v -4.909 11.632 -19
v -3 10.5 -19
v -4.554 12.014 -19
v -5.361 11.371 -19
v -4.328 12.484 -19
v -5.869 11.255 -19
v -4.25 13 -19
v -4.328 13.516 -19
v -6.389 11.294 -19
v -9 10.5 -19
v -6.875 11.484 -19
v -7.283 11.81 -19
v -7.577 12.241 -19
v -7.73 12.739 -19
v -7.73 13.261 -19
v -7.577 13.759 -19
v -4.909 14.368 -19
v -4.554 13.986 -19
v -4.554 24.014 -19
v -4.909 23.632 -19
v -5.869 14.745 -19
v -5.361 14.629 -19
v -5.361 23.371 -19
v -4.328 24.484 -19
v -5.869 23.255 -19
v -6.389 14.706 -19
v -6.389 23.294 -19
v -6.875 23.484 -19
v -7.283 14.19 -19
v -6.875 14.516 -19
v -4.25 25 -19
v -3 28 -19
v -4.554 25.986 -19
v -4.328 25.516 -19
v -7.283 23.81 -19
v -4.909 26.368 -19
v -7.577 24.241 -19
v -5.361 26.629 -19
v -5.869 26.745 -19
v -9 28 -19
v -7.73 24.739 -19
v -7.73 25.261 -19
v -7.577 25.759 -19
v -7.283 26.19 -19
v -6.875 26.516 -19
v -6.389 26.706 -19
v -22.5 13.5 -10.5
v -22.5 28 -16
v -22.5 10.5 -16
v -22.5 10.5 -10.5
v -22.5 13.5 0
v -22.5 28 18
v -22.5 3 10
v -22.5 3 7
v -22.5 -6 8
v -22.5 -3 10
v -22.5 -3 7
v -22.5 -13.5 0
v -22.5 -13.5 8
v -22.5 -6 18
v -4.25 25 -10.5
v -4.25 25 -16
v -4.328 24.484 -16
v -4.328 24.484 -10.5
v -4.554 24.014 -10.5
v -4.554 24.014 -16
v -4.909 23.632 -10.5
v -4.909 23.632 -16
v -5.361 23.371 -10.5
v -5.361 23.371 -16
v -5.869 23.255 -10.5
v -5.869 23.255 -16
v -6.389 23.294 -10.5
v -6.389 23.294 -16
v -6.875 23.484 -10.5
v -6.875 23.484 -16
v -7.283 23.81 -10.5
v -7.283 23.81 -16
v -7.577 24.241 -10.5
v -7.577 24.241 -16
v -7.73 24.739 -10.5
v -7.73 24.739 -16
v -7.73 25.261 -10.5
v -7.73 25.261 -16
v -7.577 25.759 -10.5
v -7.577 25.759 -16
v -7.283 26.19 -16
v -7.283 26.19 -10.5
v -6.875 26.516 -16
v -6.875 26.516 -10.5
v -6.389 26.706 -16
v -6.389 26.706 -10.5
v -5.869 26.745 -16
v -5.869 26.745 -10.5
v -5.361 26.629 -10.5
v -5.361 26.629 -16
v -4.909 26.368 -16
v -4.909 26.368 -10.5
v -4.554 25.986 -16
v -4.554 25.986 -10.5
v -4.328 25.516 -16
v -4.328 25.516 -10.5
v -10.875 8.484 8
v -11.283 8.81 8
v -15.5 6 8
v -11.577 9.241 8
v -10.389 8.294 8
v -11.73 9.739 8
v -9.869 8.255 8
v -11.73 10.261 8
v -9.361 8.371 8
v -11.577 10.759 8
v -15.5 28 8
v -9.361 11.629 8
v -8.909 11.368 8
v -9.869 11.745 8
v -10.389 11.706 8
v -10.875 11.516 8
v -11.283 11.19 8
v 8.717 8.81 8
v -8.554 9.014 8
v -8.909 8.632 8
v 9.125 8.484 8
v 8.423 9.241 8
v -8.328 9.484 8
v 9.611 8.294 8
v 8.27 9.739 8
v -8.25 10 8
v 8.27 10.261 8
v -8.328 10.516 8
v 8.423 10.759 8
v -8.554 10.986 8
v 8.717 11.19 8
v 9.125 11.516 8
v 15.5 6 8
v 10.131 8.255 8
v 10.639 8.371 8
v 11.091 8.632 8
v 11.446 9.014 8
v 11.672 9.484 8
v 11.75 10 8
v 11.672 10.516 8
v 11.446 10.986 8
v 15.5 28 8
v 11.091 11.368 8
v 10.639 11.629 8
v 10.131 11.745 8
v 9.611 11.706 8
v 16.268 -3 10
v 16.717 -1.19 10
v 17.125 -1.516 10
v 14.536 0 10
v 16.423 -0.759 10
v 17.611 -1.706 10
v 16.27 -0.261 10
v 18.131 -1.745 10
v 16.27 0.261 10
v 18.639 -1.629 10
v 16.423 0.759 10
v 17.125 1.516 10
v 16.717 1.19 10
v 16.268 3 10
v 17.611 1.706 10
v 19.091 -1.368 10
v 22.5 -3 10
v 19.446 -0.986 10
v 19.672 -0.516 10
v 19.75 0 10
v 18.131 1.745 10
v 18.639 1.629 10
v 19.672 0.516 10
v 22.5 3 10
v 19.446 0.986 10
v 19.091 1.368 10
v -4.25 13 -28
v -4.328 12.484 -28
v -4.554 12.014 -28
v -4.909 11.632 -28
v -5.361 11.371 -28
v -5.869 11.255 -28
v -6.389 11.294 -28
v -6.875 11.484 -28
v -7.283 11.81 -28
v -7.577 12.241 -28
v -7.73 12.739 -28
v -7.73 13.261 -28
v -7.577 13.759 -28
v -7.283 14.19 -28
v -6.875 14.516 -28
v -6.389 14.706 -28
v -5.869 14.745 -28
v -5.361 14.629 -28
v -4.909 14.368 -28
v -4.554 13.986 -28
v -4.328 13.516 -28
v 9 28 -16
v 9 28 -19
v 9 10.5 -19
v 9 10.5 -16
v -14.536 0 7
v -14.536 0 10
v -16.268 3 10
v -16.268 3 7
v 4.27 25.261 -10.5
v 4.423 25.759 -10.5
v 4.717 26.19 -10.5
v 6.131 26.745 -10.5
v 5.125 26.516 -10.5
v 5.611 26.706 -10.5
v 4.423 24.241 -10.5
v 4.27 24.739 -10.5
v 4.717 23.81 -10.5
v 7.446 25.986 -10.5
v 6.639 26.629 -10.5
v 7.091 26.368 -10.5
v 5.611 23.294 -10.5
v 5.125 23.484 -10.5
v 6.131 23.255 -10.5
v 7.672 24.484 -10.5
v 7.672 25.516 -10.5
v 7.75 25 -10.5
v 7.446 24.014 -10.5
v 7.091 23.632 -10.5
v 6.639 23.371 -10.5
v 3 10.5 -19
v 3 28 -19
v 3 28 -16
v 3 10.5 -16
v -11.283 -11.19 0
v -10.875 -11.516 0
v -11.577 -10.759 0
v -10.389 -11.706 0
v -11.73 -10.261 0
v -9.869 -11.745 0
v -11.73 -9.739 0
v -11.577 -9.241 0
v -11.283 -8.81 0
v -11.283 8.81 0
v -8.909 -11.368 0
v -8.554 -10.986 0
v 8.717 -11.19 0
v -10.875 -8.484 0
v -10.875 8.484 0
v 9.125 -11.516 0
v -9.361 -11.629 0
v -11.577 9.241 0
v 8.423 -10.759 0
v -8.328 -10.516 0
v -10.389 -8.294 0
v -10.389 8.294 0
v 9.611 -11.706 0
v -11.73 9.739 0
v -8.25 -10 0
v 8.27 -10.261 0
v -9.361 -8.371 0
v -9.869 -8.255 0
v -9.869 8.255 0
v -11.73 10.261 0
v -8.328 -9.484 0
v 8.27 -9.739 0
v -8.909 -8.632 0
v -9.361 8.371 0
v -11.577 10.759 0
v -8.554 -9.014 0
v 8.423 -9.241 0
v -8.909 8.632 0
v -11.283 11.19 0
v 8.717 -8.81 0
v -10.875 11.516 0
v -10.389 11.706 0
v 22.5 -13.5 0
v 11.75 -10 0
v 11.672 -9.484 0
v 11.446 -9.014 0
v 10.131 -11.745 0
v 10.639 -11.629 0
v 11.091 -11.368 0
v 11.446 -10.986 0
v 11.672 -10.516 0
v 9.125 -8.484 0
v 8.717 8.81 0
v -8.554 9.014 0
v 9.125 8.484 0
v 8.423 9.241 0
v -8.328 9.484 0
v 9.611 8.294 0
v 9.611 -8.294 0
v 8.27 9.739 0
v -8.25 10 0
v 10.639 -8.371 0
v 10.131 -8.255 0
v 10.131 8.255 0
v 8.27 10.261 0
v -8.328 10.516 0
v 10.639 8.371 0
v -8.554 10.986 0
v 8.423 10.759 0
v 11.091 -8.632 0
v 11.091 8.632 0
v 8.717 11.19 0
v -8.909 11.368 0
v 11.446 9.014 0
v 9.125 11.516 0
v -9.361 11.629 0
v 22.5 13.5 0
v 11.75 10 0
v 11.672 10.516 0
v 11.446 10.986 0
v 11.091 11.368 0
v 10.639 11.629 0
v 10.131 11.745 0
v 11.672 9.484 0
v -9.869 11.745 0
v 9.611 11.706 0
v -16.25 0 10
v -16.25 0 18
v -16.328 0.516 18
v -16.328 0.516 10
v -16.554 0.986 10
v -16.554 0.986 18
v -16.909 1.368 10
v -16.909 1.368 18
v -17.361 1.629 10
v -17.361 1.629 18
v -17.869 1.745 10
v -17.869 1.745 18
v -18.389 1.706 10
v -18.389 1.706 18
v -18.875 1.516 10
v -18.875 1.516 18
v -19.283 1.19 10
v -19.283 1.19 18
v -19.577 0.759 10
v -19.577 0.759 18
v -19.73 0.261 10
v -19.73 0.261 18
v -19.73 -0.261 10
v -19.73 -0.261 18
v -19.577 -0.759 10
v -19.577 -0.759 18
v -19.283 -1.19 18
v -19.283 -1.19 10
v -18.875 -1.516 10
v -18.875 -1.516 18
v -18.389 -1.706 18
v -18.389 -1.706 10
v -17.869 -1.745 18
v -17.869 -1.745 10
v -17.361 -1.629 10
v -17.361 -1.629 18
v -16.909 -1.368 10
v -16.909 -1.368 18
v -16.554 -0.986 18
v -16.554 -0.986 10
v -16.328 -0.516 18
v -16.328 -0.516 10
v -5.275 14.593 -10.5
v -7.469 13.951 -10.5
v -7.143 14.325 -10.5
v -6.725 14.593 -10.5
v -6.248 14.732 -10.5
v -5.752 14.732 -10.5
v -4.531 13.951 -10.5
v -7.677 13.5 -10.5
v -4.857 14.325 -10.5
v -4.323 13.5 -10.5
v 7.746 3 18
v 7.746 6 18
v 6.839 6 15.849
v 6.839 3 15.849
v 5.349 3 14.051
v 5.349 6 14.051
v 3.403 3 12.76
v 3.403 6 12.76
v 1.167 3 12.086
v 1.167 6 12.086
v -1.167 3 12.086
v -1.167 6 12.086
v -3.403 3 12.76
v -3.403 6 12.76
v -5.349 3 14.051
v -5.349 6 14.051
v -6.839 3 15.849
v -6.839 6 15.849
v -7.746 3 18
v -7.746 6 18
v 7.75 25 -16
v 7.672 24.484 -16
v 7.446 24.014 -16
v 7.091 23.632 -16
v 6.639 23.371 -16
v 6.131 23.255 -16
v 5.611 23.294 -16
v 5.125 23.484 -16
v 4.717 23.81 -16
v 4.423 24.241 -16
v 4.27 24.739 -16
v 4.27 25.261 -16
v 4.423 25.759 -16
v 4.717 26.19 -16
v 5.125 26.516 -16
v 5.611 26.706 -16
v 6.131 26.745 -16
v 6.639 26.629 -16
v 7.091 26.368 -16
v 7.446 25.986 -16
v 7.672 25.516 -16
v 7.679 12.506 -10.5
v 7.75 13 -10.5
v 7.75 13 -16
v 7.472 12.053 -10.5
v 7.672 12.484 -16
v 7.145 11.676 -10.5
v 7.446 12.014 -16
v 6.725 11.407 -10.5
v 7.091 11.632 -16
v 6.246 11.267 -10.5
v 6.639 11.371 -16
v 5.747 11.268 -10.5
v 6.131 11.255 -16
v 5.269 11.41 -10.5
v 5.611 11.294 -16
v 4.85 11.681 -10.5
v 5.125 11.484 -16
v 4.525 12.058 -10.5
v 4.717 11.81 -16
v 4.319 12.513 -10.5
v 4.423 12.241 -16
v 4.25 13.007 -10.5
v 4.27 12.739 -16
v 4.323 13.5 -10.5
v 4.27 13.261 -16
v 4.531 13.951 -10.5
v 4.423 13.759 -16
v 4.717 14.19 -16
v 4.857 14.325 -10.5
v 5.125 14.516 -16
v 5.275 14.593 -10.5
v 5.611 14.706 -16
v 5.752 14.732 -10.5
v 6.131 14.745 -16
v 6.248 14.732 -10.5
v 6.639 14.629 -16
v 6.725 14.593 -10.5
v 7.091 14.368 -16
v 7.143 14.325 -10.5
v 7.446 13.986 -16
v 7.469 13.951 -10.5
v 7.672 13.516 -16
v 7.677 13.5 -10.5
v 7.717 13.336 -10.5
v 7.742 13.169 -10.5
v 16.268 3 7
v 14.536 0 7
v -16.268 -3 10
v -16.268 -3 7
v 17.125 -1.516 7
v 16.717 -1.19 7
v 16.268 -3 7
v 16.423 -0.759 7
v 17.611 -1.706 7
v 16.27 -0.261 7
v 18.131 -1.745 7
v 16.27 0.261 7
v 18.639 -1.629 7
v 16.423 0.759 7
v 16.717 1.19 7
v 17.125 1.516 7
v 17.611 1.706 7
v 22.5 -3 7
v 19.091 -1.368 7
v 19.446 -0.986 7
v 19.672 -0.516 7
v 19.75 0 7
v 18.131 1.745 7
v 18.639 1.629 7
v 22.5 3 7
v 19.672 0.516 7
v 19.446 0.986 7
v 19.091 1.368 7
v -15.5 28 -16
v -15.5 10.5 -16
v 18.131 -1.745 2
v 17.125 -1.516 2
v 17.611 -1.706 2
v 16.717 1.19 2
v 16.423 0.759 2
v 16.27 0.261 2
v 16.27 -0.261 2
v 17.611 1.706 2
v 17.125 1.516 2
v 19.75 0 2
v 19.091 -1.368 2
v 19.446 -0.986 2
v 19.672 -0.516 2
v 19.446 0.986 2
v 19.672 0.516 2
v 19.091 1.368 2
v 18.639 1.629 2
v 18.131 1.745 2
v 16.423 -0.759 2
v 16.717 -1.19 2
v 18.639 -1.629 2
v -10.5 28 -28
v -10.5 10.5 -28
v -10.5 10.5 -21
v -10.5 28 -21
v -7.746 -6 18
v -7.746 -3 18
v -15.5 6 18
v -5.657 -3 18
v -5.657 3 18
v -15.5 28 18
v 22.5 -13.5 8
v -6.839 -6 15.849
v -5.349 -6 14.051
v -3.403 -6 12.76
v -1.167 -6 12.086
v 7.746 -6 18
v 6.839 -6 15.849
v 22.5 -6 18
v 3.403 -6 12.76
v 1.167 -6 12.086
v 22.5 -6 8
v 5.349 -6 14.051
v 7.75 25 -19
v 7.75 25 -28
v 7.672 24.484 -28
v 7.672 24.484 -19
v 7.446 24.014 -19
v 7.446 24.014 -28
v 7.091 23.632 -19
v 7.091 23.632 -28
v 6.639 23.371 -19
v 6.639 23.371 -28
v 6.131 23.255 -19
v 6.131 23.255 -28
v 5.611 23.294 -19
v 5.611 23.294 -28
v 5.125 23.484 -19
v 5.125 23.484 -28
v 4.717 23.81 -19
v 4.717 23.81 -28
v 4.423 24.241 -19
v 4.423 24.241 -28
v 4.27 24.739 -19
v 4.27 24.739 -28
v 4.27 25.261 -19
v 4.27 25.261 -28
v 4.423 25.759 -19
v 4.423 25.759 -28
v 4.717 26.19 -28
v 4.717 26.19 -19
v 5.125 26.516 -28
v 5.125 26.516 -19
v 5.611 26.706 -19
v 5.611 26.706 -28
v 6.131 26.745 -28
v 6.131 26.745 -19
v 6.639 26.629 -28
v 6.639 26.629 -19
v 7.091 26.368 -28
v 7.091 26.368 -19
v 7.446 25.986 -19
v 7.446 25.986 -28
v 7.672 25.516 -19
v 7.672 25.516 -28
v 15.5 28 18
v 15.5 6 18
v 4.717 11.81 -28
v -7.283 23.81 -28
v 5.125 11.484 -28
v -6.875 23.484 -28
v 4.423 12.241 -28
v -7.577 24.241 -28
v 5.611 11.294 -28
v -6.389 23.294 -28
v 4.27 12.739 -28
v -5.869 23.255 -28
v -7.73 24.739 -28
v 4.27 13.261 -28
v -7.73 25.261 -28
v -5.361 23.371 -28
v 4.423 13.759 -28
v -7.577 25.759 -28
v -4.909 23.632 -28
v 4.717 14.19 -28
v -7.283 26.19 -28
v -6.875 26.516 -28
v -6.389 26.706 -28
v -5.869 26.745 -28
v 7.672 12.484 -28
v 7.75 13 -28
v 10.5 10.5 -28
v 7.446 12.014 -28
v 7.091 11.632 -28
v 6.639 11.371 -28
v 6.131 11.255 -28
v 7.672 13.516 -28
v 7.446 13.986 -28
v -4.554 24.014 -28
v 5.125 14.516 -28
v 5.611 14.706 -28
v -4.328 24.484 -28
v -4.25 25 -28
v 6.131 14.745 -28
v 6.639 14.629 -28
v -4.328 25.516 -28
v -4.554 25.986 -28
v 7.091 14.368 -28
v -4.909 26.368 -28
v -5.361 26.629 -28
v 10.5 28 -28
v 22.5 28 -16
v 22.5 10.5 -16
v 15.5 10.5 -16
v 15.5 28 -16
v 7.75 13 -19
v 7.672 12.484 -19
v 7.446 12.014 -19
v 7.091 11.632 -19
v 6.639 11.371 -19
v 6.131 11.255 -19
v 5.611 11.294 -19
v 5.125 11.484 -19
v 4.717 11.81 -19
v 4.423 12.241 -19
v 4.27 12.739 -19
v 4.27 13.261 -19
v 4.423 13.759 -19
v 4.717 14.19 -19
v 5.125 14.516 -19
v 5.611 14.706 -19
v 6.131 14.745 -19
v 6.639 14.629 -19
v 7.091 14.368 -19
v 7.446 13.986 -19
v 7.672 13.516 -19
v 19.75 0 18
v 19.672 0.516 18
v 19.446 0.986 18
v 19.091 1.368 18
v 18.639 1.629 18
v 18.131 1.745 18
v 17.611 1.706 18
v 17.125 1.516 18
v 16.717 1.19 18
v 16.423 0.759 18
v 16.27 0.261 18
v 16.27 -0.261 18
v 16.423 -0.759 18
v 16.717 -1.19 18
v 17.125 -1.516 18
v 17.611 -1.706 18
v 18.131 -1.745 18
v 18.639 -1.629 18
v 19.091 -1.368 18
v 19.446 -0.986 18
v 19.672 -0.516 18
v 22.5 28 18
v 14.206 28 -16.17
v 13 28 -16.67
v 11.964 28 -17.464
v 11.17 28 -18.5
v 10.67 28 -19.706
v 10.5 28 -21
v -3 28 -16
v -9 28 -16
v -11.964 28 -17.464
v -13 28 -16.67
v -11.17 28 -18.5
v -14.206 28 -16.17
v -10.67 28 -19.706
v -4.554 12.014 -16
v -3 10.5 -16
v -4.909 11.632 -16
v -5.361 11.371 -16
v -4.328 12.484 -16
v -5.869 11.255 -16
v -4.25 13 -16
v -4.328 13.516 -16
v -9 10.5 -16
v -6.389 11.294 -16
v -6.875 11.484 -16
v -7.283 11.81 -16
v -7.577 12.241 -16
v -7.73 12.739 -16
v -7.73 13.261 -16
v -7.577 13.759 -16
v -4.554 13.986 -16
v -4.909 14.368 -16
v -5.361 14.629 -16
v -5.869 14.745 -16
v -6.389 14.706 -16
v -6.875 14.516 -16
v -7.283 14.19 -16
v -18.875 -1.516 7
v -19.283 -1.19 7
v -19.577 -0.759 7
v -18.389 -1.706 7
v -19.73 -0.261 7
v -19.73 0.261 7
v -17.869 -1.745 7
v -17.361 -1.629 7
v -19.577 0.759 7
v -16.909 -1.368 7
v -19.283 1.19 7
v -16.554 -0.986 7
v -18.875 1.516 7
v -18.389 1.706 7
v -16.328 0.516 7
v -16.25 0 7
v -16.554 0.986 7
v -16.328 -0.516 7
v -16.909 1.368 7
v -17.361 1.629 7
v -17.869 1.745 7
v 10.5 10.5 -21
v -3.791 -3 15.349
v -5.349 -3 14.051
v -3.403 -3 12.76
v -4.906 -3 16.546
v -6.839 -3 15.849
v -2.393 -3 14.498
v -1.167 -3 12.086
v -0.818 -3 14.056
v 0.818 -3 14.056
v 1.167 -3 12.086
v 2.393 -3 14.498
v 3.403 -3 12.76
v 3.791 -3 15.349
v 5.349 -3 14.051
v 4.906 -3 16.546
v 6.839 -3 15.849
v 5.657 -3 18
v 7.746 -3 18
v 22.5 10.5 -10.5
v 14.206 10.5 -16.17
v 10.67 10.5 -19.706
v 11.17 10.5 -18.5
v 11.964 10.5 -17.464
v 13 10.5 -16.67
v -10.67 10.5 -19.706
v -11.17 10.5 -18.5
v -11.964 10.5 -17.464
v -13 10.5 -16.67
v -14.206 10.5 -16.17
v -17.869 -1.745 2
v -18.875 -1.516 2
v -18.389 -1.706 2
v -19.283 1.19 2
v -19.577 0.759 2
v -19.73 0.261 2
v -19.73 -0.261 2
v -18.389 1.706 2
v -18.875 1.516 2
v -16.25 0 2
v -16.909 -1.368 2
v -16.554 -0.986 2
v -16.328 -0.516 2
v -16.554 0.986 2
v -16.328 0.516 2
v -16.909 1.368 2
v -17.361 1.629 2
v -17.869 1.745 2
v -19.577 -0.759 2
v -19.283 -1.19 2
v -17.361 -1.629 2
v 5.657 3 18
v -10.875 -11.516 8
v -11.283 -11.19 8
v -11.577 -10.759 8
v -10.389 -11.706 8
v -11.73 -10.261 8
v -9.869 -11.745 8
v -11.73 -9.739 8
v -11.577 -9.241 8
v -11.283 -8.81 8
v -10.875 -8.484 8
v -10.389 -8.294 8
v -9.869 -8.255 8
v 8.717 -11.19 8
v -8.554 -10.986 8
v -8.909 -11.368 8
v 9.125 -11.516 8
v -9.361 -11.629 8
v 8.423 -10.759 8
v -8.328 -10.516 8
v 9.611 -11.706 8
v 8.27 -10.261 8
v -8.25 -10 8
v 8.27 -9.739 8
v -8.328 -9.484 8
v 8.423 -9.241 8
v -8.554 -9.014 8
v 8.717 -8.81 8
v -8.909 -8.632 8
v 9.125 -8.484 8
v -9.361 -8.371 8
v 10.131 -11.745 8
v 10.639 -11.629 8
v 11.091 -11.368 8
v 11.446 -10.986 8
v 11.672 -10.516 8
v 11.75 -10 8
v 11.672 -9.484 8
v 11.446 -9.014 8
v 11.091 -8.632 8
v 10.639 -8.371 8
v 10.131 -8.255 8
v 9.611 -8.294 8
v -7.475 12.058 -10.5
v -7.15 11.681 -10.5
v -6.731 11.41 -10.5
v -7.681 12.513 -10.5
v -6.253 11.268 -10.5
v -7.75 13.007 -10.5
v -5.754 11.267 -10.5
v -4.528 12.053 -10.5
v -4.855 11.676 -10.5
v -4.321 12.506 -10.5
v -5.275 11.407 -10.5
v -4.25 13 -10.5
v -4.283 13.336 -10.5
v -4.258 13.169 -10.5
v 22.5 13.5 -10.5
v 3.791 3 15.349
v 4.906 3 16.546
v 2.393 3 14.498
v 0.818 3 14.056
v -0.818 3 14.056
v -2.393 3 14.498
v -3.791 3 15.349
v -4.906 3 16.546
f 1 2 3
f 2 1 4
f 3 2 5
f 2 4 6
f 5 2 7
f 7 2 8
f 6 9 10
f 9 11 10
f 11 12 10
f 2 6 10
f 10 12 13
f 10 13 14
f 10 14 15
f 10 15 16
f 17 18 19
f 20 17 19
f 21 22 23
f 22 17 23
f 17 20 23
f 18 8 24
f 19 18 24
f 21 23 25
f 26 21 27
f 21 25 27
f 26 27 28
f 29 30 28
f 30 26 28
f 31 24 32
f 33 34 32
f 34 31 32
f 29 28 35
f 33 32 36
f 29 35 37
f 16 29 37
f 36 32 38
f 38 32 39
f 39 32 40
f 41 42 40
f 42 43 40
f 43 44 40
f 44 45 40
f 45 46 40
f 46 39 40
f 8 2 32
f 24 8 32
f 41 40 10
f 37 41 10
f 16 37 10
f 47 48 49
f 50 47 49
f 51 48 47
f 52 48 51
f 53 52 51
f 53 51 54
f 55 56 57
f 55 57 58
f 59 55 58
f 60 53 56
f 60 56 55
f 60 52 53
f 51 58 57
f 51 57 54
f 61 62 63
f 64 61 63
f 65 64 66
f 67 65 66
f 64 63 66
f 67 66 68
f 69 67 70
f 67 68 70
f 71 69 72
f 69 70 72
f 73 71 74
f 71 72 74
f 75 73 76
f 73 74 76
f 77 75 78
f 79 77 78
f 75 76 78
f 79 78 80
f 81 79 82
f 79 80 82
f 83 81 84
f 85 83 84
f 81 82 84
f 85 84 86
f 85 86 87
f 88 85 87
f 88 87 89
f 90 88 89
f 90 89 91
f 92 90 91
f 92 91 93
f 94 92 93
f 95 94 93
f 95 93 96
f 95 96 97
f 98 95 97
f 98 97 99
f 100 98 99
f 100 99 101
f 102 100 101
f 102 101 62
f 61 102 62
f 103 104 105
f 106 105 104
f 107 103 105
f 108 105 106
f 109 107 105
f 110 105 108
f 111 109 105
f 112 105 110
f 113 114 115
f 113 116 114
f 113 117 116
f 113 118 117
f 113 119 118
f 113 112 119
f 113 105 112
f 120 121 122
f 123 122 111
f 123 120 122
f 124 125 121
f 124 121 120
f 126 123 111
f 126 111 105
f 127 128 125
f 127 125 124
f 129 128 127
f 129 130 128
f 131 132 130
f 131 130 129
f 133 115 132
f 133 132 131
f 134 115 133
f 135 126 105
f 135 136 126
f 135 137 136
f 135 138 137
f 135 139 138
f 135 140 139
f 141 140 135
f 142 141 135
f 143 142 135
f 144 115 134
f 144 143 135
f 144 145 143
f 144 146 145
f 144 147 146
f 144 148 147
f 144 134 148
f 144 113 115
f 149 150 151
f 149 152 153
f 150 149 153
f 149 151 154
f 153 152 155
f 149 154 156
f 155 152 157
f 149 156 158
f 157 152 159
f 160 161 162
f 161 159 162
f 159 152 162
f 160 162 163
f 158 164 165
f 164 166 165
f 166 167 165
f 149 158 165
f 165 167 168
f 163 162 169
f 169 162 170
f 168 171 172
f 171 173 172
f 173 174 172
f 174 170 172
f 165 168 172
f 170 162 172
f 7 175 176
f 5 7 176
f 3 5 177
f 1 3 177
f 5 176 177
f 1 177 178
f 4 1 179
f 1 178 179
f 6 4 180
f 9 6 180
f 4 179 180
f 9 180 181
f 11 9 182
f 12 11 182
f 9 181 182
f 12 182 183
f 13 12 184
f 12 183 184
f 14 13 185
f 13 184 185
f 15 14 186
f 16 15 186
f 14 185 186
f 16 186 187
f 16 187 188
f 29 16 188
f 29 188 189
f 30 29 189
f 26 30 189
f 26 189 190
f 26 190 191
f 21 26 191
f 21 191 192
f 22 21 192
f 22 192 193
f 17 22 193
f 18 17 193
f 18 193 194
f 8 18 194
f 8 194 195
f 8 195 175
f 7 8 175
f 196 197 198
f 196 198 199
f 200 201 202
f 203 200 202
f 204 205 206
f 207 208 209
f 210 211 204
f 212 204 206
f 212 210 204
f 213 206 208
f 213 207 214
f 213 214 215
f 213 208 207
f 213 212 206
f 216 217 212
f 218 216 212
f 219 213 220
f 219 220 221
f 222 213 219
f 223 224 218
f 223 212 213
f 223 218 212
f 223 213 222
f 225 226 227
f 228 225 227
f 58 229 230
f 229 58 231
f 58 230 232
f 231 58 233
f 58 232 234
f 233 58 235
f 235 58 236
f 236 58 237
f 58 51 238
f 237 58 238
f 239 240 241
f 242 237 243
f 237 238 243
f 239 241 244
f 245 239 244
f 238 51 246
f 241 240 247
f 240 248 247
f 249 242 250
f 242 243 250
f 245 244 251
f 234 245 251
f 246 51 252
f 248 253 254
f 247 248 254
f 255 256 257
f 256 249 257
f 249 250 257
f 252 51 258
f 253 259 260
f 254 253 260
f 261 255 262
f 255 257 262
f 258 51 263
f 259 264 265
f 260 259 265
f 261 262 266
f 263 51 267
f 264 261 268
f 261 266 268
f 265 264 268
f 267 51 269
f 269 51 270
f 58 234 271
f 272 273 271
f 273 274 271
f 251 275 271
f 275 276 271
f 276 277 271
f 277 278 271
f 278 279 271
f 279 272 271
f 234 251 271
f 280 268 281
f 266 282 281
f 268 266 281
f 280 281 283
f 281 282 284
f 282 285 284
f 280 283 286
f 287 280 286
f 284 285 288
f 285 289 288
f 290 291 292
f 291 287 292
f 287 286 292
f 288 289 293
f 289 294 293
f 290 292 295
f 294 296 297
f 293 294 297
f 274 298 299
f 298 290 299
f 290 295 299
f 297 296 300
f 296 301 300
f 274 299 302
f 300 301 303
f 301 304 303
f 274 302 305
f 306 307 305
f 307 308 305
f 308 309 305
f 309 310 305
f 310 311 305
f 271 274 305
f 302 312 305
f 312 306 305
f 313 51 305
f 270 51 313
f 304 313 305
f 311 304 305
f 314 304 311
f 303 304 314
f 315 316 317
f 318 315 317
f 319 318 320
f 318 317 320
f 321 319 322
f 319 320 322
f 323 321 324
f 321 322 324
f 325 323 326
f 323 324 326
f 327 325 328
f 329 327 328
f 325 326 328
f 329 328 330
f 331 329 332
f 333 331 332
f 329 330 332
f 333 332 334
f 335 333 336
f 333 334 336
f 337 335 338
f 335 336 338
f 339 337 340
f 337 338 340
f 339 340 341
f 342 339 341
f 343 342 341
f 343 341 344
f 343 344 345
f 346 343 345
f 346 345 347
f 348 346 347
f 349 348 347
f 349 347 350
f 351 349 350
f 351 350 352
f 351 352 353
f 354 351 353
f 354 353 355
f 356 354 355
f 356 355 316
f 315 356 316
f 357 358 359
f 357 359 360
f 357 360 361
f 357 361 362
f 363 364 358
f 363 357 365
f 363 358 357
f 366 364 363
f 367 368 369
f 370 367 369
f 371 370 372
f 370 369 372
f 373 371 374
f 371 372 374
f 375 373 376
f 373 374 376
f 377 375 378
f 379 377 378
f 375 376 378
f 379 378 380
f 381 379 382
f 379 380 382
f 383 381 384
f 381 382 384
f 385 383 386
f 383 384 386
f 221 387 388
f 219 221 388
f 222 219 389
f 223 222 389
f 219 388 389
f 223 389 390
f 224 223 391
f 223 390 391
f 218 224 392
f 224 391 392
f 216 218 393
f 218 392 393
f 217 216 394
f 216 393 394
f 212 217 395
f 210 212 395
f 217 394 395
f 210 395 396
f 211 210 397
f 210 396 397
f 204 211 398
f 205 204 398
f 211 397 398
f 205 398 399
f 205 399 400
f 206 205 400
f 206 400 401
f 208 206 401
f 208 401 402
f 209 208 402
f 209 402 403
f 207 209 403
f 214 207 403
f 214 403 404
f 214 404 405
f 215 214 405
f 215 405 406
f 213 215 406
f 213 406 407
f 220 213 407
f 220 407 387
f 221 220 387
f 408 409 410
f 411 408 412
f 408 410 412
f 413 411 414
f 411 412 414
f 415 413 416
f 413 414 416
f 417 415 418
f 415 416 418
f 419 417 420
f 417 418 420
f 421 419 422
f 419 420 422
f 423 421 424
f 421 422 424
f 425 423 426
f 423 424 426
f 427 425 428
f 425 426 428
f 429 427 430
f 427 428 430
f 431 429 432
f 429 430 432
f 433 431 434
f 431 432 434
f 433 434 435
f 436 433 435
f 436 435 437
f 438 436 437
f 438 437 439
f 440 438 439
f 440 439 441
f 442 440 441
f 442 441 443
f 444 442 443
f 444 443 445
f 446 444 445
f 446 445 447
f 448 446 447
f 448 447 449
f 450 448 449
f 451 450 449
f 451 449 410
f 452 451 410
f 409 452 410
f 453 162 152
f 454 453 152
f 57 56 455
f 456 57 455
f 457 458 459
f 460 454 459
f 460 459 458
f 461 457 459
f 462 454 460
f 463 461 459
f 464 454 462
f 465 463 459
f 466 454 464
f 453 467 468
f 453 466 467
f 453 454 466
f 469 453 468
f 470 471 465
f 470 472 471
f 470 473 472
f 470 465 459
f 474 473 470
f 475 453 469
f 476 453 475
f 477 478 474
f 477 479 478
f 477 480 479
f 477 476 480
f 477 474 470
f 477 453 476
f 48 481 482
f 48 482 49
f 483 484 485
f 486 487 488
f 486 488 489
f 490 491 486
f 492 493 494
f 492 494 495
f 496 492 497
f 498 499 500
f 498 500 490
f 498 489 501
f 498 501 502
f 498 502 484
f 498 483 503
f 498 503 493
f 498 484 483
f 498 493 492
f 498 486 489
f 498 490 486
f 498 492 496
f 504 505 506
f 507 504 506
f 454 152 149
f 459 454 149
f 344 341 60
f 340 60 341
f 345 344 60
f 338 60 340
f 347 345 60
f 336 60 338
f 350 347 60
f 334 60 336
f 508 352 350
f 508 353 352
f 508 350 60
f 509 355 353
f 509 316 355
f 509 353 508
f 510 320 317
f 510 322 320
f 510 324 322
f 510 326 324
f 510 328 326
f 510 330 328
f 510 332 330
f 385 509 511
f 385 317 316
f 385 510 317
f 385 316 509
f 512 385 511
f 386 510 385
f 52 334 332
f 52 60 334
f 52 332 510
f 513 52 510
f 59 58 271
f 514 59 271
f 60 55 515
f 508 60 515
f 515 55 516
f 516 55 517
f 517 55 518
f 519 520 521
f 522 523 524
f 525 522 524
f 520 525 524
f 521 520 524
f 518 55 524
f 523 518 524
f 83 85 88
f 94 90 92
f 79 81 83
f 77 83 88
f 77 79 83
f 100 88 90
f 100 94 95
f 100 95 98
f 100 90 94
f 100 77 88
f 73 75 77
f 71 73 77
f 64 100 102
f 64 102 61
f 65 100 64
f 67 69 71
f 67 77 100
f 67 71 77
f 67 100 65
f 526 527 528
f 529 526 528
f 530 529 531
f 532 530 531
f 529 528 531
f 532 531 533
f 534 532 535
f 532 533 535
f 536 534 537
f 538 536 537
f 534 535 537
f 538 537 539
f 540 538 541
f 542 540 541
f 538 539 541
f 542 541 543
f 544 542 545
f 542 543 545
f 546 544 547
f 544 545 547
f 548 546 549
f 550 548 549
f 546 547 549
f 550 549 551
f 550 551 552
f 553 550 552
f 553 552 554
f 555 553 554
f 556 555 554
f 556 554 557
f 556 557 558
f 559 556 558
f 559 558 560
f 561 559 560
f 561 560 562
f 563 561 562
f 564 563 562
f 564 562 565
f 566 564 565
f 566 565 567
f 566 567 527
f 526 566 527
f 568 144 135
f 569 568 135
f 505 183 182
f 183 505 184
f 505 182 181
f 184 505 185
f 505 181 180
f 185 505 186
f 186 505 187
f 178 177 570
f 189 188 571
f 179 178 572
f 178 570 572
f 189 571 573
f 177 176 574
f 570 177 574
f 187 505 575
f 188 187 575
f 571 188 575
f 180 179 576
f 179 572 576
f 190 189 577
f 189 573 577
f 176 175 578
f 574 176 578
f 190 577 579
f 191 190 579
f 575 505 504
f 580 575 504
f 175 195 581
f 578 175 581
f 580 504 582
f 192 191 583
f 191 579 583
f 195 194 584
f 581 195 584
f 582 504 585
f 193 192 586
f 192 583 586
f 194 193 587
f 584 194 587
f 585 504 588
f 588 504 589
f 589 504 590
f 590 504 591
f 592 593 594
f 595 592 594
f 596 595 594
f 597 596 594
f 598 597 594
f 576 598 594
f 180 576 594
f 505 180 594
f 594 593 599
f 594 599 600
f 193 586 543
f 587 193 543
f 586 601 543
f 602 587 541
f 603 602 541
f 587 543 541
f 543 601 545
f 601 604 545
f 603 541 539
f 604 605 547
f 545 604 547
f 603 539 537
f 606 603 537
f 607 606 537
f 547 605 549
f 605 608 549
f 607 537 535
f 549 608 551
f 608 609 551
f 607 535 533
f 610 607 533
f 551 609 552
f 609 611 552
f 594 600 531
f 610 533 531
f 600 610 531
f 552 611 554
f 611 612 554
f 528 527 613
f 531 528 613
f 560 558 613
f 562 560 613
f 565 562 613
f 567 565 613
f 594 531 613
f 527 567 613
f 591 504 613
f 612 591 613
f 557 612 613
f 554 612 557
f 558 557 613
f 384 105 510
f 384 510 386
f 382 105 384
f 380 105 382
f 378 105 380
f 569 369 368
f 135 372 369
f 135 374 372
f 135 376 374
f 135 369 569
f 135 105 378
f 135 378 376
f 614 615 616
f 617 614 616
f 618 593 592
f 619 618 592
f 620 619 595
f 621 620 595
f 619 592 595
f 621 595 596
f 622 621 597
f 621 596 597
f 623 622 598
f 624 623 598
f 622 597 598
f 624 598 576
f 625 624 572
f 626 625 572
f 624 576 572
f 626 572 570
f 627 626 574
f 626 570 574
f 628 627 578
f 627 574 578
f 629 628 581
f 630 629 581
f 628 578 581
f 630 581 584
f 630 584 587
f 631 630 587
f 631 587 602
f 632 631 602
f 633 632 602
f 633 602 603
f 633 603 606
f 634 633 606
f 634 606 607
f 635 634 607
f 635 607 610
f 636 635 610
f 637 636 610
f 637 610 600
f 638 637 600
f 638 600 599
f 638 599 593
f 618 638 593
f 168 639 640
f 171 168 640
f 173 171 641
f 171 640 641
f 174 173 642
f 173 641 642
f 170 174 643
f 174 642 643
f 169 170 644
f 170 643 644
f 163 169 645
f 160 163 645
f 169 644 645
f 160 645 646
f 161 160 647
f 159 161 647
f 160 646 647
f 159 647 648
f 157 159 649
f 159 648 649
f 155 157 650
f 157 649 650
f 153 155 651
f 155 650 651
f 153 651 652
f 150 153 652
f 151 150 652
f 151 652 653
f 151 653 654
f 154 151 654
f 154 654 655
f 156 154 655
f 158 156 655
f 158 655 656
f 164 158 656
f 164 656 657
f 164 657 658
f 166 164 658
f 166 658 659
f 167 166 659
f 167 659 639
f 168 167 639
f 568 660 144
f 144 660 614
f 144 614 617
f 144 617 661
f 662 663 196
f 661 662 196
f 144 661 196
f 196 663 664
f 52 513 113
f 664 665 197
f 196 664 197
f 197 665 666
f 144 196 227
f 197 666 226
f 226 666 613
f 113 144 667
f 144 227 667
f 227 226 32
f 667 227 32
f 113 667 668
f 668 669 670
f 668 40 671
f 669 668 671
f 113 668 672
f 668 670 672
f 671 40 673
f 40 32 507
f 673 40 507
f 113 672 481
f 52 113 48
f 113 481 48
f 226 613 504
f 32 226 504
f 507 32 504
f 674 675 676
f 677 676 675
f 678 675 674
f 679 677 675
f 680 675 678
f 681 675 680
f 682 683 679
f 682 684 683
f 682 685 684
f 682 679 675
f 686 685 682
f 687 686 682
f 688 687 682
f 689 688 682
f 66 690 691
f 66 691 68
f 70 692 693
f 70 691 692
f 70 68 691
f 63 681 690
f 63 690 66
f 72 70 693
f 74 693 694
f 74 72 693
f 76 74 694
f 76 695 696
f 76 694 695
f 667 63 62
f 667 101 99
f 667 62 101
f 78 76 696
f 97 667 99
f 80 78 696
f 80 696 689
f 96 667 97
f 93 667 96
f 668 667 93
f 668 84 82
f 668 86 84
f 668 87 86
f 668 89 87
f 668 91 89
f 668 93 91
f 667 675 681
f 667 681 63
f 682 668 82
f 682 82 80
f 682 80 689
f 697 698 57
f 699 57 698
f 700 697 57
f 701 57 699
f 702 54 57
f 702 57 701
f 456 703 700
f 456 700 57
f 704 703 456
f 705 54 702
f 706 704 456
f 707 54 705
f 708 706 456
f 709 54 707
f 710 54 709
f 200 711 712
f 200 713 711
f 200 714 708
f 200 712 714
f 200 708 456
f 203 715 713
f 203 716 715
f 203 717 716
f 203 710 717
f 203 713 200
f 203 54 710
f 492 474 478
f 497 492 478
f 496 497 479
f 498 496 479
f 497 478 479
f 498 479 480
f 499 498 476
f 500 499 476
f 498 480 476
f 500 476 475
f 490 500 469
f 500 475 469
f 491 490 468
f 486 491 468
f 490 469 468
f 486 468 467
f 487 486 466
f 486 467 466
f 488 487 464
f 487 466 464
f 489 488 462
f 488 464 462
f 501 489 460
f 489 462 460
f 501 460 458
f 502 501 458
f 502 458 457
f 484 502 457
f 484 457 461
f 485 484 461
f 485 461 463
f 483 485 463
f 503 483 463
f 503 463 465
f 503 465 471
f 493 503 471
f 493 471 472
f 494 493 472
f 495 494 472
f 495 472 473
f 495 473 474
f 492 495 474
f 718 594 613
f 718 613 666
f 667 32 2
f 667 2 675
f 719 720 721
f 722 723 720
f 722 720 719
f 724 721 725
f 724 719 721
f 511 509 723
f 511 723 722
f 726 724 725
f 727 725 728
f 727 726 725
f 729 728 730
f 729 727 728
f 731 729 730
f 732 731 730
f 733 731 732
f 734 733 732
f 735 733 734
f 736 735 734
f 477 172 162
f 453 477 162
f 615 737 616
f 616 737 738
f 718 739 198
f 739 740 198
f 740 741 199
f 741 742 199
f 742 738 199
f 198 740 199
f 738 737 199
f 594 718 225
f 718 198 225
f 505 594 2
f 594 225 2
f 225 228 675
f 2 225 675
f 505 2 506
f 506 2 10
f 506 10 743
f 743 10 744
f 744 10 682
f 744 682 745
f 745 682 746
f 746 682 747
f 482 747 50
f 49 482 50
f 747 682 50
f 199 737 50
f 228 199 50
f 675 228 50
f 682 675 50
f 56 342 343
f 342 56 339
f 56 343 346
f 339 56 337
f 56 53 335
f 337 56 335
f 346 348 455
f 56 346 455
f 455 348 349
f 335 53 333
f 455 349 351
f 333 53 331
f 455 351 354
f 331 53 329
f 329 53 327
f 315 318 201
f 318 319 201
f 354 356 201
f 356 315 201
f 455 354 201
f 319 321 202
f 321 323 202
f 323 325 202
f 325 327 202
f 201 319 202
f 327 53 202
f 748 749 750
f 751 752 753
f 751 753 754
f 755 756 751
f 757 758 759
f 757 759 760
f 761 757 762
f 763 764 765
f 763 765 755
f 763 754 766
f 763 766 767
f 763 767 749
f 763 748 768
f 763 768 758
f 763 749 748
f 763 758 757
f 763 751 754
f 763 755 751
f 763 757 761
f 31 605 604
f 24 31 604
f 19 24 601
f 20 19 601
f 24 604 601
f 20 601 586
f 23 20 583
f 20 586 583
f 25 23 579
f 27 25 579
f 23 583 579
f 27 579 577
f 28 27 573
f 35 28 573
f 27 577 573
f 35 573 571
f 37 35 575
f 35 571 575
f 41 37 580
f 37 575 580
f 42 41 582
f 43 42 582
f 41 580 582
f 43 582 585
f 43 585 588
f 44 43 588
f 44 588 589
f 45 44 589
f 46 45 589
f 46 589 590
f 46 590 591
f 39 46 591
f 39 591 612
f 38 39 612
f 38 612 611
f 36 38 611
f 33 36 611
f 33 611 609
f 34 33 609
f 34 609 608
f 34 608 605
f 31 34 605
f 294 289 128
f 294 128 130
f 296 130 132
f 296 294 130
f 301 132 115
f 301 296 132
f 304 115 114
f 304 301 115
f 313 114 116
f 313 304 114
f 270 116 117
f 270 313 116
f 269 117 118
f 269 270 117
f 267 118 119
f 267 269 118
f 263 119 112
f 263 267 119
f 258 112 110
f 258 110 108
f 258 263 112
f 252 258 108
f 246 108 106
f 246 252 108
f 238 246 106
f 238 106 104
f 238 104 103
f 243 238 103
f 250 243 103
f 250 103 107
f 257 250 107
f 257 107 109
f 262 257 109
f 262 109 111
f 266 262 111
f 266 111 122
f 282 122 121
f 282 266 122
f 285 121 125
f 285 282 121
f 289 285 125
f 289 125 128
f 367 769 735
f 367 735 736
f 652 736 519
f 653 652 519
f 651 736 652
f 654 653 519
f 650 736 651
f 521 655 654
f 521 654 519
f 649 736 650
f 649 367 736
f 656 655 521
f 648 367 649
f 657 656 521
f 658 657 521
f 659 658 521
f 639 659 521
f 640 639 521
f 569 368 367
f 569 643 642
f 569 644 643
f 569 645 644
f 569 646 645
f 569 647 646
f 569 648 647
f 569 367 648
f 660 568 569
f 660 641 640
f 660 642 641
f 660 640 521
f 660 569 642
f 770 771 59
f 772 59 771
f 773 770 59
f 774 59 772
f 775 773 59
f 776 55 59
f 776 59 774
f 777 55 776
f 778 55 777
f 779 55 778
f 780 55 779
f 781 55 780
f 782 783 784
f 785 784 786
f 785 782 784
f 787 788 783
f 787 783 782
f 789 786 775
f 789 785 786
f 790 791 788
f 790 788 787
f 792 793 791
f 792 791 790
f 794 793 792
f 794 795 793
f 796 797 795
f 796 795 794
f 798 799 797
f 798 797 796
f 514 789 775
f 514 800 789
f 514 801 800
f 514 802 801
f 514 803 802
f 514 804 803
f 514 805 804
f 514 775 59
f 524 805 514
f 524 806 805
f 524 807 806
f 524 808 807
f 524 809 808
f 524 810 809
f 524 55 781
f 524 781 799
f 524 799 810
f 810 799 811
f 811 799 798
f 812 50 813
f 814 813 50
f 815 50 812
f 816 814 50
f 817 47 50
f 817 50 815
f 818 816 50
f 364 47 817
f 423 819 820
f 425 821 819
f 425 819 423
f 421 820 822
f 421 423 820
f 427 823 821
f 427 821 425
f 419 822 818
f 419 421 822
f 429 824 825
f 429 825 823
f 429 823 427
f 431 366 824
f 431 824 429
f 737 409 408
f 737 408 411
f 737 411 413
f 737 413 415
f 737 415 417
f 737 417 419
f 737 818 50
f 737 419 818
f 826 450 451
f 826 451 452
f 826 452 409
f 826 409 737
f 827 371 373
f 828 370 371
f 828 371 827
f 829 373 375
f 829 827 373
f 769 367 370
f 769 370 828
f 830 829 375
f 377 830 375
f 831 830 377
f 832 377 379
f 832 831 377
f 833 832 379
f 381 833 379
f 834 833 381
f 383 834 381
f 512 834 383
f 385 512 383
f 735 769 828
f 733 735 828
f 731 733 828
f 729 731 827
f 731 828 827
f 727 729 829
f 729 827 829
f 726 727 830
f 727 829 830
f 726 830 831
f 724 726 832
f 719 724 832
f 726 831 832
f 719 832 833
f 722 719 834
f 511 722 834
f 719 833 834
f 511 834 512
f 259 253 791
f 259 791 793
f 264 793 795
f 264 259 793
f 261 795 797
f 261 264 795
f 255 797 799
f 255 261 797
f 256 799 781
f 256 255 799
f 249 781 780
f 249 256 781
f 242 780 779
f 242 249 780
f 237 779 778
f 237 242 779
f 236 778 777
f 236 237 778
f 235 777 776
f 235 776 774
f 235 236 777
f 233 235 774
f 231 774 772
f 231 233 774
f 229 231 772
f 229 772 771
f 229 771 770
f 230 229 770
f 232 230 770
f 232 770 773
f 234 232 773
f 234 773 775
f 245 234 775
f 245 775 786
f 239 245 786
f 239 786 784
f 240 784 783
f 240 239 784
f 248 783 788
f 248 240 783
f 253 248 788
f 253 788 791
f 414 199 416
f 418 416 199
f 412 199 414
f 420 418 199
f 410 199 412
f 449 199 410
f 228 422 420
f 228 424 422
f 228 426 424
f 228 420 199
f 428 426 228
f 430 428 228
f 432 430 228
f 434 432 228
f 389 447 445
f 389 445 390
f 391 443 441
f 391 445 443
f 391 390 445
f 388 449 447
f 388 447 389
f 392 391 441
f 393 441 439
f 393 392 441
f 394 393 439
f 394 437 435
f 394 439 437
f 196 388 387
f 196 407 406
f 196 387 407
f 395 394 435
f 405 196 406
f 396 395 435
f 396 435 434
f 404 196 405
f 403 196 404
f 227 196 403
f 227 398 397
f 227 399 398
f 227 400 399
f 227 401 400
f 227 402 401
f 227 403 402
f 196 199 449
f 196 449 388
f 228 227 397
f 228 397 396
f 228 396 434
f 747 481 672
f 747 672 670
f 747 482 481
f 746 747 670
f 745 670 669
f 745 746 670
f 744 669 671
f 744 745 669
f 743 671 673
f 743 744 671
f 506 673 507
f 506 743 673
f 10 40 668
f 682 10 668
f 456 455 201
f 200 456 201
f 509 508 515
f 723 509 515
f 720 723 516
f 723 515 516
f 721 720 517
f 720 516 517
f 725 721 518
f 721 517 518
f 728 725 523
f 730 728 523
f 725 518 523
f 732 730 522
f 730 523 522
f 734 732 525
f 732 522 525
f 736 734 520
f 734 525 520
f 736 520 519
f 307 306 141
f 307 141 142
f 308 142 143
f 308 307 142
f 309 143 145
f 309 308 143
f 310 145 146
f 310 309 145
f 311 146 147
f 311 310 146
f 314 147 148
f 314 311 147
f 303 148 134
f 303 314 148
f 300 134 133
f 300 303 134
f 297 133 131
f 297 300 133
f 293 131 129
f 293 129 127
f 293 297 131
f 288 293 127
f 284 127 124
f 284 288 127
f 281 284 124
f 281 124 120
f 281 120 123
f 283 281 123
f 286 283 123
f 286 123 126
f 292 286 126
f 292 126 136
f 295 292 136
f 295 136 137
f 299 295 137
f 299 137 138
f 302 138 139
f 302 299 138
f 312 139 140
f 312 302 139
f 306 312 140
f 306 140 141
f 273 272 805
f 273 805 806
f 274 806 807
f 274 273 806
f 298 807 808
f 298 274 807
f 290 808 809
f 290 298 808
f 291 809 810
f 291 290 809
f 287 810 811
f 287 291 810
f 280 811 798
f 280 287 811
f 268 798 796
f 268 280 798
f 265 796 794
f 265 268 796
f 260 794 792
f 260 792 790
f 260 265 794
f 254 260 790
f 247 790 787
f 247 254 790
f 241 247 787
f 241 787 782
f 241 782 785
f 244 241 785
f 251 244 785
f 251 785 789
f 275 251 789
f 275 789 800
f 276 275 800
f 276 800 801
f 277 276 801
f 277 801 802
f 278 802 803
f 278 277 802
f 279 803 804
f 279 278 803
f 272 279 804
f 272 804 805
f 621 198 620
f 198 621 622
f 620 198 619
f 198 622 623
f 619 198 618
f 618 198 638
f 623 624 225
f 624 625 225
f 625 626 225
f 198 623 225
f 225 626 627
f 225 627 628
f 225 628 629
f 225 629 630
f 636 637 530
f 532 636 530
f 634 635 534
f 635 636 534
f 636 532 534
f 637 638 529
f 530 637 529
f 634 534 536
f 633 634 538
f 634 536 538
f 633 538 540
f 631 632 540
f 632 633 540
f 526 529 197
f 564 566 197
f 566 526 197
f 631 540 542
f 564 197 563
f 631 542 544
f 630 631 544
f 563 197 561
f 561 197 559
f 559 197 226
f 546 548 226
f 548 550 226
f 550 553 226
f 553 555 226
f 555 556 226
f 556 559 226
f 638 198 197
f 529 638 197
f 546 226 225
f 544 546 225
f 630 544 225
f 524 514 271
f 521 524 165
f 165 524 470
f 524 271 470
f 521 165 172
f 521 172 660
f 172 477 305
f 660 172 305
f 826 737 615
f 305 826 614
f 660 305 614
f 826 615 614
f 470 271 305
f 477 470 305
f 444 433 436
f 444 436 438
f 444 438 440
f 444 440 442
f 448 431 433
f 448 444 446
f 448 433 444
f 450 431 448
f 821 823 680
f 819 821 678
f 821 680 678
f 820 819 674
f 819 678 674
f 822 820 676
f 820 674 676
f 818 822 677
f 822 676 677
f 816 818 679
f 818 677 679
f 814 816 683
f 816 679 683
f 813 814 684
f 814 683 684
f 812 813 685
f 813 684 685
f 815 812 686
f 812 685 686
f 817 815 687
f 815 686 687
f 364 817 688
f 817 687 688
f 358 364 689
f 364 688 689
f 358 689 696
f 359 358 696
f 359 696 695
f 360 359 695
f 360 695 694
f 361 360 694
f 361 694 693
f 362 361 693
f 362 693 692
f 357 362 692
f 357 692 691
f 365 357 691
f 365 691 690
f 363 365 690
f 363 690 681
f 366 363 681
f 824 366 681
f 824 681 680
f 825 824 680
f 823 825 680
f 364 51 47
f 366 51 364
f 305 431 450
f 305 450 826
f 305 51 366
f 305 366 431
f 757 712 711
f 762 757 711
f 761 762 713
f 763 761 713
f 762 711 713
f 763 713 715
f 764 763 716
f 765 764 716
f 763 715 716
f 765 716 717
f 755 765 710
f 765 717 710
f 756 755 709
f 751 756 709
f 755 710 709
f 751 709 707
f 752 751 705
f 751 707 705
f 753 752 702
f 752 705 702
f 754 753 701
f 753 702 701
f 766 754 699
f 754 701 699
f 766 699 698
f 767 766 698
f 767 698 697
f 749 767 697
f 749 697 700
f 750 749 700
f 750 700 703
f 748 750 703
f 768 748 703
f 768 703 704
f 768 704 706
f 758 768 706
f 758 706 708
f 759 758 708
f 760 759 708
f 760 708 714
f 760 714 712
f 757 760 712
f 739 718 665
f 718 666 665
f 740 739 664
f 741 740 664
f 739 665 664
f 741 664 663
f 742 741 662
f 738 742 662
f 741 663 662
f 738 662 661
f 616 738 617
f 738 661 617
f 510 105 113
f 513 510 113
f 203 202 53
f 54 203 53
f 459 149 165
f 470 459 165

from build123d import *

# Parameters (mm, degrees)
F0_W      = 45
F0_H      = 27
F0_R      = 1.75
F0_H_2    = 14.5
F1_DEPTH  = 8
F2_DEPTH  = 28
F3_W      = 31
F3_H      = 12
F4_DEPTH  = 10
F6_DEPTH  = 19.501
F7_DEPTH  = 3
F8_R      = 8
F9_DEPTH  = 3
F11_DEPTH = 11
F12_DEPTH = 8
F13_R     = 1.75
F14_DEPTH = 16
F15_W     = 12
F15_H     = 12
F16_DEPTH = 41.501
F17_DEPTH = 17.5
F18_R     = 1.75
F19_DEPTH = 17.5
F20_W     = 6
F20_H     = 3
F21_DEPTH = 41.501
F22_R     = 5


with BuildPart() as f1:
    # F0 (on Top) → F1 (new body)
    with BuildSketch(Plane.XY):
        Rectangle(F0_W, F0_H)
        with Locations((-10, -10)):
            Circle(F0_R, mode=Mode.SUBTRACT)
        with Locations((10, -10)):
            Circle(F0_R, mode=Mode.SUBTRACT)
        with Locations((-10, 10)):
            Circle(F0_R, mode=Mode.SUBTRACT)
        with Locations((10, 10)):
            Circle(F0_R, mode=Mode.SUBTRACT)
        with Locations((0, 20.75)):
            Rectangle(F0_W, F0_H_2)
    extrude(amount=F1_DEPTH)

    # F0 (on Top) → F2 (join)
    with BuildSketch(Plane.XY):
        with Locations((0, 20.75)):
            Rectangle(F0_W, F0_H_2)
    extrude(amount=-F2_DEPTH)

    # F3 (on face) → F4 (join)
    with BuildSketch(Plane.XY.offset(8)):
        Polygon((-22.5, 28), (-22.5, -6), (-15.5, -6), (-15.5, 6), (-15.5, 28), align=None)
        Rectangle(F3_W, F3_H)
        Polygon((15.5, 6), (15.5, -6), (22.5, -6), (22.5, 28), (15.5, 28), align=None)
    extrude(amount=F4_DEPTH)

    # F5 (on face) → F6 (cut, through all)
    with BuildSketch(Plane(origin=(0, 6, 0), x_dir=(-1, 0, 0), z_dir=(0, 1, 0))):
        with BuildLine():
            Line((5.6568542495, 18), (-5.6568542495, 18))
            ThreePointArc((-5.6568542495, 18), (0, 14), (5.6568542495, 18))
        make_face()
    extrude(amount=-F6_DEPTH, mode=Mode.SUBTRACT)

    # F5 (on face) → F7 (cut)
    with BuildSketch(Plane(origin=(0, 6, 0), x_dir=(-1, 0, 0), z_dir=(0, 1, 0))):
        with BuildLine():
            Line((-5.6568542495, 18), (-7.7459666924, 18))
            ThreePointArc((-7.7459666924, 18), (0, 12), (7.7459666924, 18))
            Line((7.7459666924, 18), (5.6568542495, 18))
            ThreePointArc((5.6568542495, 18), (0, 14), (-5.6568542495, 18))
        make_face()
    extrude(amount=-F7_DEPTH, mode=Mode.SUBTRACT)

    # F8 (on face) → F9 (cut)
    with BuildSketch(Plane.XZ.offset(6)):
        with Locations((0, 20)):
            Circle(F8_R)
    extrude(amount=-F9_DEPTH, mode=Mode.SUBTRACT)

    # F10 (on face) → F11 (cut)
    with BuildSketch(Plane.XY.offset(18)):
        Polygon((-19.7320508076, -3), (-16.2679491924, -3), (-14.5358983849, 0), (-16.2679491924, 3), (-19.7320508076, 3), (-22.5, 3), (-22.5, -3), align=None)
        Polygon((14.5358983849, 0), (16.2679491924, -3), (19.7320508076, -3), (22.5, -3), (22.5, 3), (19.3412657973, 3), (16.2679491924, 3), align=None)
    extrude(amount=-F11_DEPTH, mode=Mode.SUBTRACT)

    # F10 (on face) → F12 (join)
    with BuildSketch(Plane.XY.offset(18)):
        Polygon((-19.7320508076, -3), (-16.2679491924, -3), (-14.5358983849, 0), (-16.2679491924, 3), (-19.7320508076, 3), (-22.5, 3), (-22.5, -3), align=None)
        Polygon((14.5358983849, 0), (16.2679491924, -3), (19.7320508076, -3), (22.5, -3), (22.5, 3), (19.3412657973, 3), (16.2679491924, 3), align=None)
    extrude(amount=-F12_DEPTH)

    # F13 (on face) → F14 (cut)
    with BuildSketch(Plane.XY.offset(18)):
        with Locations((-18, 0)):
            Circle(F13_R)
        with Locations((18, 0)):
            Circle(F13_R)
    extrude(amount=-F14_DEPTH, mode=Mode.SUBTRACT)

    # F15 (on face) → F16 (cut, through all)
    with BuildSketch(Plane(origin=(0, 28, 0), x_dir=(-1, 0, 0), z_dir=(0, 1, 0))):
        with Locations((16.5, -22)):
            Rectangle(F15_W, F15_H)
        with Locations((-16.5, -22)):
            Rectangle(F15_W, F15_H)
    extrude(amount=-F16_DEPTH, mode=Mode.SUBTRACT)

    # F15 (on face) → F17 (join)
    with BuildSketch(Plane(origin=(0, 28, 0), x_dir=(-1, 0, 0), z_dir=(0, 1, 0))):
        Polygon((-10.5, -16), (-10.5, -28), (10.5, -28), (10.5, -16), (22.5, -16), (22.5, -10.5), (-22.5, -10.5), (-22.5, -16), align=None)
    extrude(amount=-F17_DEPTH)

    # F18 (on face) → F19 (cut)
    with BuildSketch(Plane(origin=(0, 0, -28), x_dir=(1, 0, 0), z_dir=(0, 0, -1))):
        with Locations((-6, -13)):
            Circle(F18_R)
        with Locations((6, -13)):
            Circle(F18_R)
        with Locations((6, -25)):
            Circle(F18_R)
        with Locations((-6, -25)):
            Circle(F18_R)
    extrude(amount=-F19_DEPTH, mode=Mode.SUBTRACT)

    # F20 (on face) → F21 (cut, through all)
    with BuildSketch(Plane(origin=(0, 28, 0), x_dir=(-1, 0, 0), z_dir=(0, 1, 0))):
        with Locations((-6, -17.5)):
            Rectangle(F20_W, F20_H)
        with Locations((6, -17.5)):
            Rectangle(F20_W, F20_H)
    extrude(amount=-F21_DEPTH, mode=Mode.SUBTRACT)

    # F22
    f22_edges = [f1.edges().sort_by_distance(p)[0] for p in [
        (-10.5, 19.25, -16),
        (10.5, 19.25, -16),
    ]]
    fillet(f22_edges, radius=F22_R)


solid = f1.part
